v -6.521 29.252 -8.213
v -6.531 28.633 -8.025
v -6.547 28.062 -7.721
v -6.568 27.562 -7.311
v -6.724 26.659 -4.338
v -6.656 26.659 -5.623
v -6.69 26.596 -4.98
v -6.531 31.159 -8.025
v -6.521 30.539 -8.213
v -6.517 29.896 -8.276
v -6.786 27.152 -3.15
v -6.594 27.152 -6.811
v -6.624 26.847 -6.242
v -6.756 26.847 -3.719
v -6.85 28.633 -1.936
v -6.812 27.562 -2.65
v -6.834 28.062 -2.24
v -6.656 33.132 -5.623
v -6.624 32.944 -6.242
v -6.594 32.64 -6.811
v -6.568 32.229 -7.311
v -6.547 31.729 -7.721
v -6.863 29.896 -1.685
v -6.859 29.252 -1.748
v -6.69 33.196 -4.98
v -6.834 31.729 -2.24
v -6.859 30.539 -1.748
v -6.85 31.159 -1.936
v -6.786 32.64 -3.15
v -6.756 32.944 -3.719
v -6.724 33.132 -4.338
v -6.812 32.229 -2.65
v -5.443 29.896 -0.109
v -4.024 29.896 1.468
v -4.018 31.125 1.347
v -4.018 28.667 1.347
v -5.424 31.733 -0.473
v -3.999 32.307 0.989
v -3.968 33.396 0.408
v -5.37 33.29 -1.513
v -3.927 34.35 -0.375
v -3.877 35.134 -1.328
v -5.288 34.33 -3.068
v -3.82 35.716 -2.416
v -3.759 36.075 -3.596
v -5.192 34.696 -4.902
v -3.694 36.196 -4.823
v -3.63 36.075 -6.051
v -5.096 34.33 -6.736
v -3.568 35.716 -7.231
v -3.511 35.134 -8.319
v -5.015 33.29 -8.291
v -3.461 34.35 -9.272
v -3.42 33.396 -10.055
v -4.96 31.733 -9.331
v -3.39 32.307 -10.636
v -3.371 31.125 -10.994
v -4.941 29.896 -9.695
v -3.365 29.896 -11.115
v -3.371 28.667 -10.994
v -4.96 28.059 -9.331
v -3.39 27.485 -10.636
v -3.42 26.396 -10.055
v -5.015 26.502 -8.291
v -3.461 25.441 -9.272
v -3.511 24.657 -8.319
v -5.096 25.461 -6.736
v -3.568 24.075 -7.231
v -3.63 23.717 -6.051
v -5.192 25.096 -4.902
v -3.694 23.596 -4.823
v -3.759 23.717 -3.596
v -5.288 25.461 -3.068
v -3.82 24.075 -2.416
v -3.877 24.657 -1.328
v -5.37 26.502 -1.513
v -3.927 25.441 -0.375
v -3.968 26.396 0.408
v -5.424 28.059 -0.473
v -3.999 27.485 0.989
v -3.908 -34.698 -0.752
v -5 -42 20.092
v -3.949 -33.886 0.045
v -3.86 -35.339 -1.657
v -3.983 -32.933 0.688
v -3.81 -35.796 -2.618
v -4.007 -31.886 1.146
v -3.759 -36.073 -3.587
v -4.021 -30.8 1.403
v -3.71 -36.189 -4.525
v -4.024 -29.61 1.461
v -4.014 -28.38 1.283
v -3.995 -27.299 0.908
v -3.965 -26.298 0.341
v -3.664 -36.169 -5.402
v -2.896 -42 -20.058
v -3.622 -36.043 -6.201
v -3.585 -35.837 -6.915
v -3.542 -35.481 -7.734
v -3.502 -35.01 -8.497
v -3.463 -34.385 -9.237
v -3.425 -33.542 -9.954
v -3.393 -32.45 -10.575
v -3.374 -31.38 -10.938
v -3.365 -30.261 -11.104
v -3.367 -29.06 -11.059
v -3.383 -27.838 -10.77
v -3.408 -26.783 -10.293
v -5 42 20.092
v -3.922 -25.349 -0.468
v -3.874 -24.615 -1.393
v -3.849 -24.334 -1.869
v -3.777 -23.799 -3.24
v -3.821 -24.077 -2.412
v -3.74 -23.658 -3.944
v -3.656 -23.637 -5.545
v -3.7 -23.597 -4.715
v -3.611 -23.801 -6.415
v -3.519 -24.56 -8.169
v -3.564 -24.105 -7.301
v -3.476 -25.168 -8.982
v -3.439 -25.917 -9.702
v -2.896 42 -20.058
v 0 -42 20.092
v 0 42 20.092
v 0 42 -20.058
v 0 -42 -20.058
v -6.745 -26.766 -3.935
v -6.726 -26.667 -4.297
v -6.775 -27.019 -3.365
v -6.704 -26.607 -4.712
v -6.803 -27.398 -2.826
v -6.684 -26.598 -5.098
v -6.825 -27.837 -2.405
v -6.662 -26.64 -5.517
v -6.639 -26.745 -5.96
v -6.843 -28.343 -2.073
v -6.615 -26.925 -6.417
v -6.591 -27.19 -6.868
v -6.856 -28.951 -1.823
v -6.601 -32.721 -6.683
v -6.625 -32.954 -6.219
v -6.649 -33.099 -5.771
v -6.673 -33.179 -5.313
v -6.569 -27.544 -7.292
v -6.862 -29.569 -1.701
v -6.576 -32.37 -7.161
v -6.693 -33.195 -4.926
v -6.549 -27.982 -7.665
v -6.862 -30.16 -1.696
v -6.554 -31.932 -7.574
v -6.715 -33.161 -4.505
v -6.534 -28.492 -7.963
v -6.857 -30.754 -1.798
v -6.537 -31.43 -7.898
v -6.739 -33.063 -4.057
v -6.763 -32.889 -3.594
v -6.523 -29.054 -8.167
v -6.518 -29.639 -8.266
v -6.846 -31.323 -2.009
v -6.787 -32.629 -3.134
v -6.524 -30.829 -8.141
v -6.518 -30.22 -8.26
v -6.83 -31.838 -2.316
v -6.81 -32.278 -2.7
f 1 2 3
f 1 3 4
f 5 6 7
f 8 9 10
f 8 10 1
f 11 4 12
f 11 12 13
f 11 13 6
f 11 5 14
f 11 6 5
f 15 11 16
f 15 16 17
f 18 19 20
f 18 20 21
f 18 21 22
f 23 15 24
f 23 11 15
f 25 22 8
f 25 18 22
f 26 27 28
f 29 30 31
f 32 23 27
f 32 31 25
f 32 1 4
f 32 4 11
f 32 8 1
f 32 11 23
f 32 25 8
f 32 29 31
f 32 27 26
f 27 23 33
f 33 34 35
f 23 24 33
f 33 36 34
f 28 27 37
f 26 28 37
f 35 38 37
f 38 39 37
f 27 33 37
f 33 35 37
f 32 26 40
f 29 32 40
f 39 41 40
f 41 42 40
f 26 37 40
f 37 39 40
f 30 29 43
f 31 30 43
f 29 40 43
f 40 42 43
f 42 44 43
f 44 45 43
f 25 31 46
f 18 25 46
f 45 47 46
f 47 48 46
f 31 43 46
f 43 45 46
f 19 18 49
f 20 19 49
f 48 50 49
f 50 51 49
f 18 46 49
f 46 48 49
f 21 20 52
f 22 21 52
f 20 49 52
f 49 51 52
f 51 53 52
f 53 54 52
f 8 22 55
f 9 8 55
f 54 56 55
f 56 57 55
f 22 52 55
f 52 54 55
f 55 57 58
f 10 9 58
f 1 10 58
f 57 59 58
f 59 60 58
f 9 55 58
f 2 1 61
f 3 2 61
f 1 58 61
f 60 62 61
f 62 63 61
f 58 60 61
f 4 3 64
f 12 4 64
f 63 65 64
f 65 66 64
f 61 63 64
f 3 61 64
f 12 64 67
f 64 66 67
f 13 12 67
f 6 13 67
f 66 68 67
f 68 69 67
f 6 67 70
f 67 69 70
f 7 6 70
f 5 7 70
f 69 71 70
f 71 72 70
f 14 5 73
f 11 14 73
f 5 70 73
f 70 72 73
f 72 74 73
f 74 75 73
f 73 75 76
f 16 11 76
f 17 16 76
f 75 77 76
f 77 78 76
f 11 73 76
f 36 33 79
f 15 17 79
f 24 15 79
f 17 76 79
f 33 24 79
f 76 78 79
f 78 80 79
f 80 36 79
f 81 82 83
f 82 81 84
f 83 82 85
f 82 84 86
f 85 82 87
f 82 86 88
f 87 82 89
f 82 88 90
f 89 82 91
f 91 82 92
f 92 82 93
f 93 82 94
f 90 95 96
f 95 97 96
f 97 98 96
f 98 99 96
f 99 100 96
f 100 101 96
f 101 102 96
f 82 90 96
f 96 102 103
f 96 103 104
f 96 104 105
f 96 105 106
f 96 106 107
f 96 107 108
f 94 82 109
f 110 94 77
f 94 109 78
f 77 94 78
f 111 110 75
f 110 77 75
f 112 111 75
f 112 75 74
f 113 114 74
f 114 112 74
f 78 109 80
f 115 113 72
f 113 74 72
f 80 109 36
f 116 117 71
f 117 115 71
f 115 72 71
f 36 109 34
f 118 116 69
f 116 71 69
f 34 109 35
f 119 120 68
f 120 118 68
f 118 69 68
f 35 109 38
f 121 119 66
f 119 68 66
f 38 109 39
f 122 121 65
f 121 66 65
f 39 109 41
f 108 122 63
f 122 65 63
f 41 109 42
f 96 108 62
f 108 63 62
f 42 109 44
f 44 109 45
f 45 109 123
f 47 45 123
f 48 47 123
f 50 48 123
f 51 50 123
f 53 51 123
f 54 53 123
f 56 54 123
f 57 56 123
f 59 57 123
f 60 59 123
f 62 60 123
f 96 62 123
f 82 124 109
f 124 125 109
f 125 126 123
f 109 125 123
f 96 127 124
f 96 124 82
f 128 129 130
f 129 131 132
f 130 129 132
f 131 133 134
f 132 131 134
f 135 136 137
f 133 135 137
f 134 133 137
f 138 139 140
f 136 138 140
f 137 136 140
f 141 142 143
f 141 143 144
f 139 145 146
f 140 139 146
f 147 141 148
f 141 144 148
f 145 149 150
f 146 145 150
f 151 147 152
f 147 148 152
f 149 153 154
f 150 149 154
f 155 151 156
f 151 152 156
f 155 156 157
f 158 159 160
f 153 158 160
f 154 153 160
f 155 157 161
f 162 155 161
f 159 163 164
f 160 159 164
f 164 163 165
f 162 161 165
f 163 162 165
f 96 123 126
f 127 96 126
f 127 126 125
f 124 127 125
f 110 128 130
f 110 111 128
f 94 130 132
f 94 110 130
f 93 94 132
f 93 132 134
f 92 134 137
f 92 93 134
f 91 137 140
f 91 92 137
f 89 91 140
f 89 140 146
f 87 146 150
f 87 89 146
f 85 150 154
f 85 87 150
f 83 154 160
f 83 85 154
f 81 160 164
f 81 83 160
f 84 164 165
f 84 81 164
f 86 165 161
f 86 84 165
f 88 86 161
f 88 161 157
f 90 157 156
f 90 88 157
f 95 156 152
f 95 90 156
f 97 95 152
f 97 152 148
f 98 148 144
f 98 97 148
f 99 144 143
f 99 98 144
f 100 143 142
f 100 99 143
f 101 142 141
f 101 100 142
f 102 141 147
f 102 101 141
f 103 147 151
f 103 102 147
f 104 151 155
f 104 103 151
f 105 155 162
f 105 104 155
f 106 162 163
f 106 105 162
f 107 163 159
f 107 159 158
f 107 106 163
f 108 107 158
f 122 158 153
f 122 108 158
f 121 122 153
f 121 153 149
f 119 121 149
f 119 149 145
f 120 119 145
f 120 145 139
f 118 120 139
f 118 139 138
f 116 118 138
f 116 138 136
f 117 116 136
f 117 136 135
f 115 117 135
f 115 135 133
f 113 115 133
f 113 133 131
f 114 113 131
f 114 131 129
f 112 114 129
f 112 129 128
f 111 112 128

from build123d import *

# Parameters (mm, degrees)
BOSS_EXTRUDE1_DEPTH = 42
SKETCH3_7_R         = 3.3
SKETCH2_6_R         = 6.3


with BuildPart() as part:
    # Sketch1 → Boss-Extrude1 (new, symmetric)
    with BuildSketch(Plane(origin=(0, 0, 0), x_dir=(1, 0, 0), z_dir=(0, 1, 0))):
        Polygon((0, 20.057673142), (0, -20.092326858), (-5, -20.092326858), (-2.895827662, 20.057673142), align=None)
    extrude(amount=BOSS_EXTRUDE1_DEPTH, both=True)

    # Loft2: read off the stored shape, not the designer's step
    # Loft2: loft between two sections, ruled curve by curve
    loft2_from = [
        Edge.make_bspline([(-6.744919191, -26.766256905, -3.934599382), (-7.072478945, -28.860904588, 2.315613069), (-6.962853556, -35.119694494, 0.223836028), (-6.635293801, -33.025046811, -6.026376424), (-6.307734047, -30.930399127, -12.276588875), (-6.417359436, -24.671609222, -10.184811834), (-6.744919191, -26.766256905, -3.934599382)], [0, 0, 0, 0, 0.5, 0.5, 0.5, 1, 1, 1, 1], 3, [1, 0.333333333, 0.333333333, 1, 0.333333333, 0.333333333, 1]),
    ]
    loft2_to = [
        Edge.make_bspline([(-3.874025978, -24.614903671, -1.39253736), (-4.42677199, -31.486205901, 9.154484851), (-4.067155817, -42.047702275, 2.292599502), (-3.514409805, -35.176400045, -8.254422709), (-2.961663793, -28.305097815, -18.801444919), (-3.321279966, -17.743601441, -11.93955957), (-3.874025978, -24.614903671, -1.39253736)], [0, 0, 0, 0, 0.5, 0.5, 0.5, 1, 1, 1, 1], 3, [1, 0.333333333, 0.333333333, 1, 0.333333333, 0.333333333, 1]),
    ]
    loft2 = Solid(Shell([*[Face.make_surface_from_curves(loft2_from[k], loft2_to[k]) for k in range(1)], Face(Wire(loft2_from)), Face(Wire(loft2_to))]))
    add(loft2)

    # Sketch3<7> → Loft3 section 0
    with BuildSketch(Plane(origin=(-6.932083318, 0, -0.363295092), x_dir=(-0.052335956242940435, 0, 0.998629534754574), z_dir=(-0.9986295347545742, 0, -0.052335956242940435))):
        with Locations((-4.623529197, 29.895651858)):
            Circle(SKETCH3_7_R)
    # Sketch2<6> → Loft3 section 1
    with BuildSketch(Plane(origin=(-3.936194713, 0, -0.206287224), x_dir=(-0.052335956242940435, 0, 0.998629534754574), z_dir=(-0.9986295347545742, 0, -0.052335956242940435))):
        with Locations((-4.623529197, 29.895651858)):
            Circle(SKETCH2_6_R)
    loft()


solid = part.part
